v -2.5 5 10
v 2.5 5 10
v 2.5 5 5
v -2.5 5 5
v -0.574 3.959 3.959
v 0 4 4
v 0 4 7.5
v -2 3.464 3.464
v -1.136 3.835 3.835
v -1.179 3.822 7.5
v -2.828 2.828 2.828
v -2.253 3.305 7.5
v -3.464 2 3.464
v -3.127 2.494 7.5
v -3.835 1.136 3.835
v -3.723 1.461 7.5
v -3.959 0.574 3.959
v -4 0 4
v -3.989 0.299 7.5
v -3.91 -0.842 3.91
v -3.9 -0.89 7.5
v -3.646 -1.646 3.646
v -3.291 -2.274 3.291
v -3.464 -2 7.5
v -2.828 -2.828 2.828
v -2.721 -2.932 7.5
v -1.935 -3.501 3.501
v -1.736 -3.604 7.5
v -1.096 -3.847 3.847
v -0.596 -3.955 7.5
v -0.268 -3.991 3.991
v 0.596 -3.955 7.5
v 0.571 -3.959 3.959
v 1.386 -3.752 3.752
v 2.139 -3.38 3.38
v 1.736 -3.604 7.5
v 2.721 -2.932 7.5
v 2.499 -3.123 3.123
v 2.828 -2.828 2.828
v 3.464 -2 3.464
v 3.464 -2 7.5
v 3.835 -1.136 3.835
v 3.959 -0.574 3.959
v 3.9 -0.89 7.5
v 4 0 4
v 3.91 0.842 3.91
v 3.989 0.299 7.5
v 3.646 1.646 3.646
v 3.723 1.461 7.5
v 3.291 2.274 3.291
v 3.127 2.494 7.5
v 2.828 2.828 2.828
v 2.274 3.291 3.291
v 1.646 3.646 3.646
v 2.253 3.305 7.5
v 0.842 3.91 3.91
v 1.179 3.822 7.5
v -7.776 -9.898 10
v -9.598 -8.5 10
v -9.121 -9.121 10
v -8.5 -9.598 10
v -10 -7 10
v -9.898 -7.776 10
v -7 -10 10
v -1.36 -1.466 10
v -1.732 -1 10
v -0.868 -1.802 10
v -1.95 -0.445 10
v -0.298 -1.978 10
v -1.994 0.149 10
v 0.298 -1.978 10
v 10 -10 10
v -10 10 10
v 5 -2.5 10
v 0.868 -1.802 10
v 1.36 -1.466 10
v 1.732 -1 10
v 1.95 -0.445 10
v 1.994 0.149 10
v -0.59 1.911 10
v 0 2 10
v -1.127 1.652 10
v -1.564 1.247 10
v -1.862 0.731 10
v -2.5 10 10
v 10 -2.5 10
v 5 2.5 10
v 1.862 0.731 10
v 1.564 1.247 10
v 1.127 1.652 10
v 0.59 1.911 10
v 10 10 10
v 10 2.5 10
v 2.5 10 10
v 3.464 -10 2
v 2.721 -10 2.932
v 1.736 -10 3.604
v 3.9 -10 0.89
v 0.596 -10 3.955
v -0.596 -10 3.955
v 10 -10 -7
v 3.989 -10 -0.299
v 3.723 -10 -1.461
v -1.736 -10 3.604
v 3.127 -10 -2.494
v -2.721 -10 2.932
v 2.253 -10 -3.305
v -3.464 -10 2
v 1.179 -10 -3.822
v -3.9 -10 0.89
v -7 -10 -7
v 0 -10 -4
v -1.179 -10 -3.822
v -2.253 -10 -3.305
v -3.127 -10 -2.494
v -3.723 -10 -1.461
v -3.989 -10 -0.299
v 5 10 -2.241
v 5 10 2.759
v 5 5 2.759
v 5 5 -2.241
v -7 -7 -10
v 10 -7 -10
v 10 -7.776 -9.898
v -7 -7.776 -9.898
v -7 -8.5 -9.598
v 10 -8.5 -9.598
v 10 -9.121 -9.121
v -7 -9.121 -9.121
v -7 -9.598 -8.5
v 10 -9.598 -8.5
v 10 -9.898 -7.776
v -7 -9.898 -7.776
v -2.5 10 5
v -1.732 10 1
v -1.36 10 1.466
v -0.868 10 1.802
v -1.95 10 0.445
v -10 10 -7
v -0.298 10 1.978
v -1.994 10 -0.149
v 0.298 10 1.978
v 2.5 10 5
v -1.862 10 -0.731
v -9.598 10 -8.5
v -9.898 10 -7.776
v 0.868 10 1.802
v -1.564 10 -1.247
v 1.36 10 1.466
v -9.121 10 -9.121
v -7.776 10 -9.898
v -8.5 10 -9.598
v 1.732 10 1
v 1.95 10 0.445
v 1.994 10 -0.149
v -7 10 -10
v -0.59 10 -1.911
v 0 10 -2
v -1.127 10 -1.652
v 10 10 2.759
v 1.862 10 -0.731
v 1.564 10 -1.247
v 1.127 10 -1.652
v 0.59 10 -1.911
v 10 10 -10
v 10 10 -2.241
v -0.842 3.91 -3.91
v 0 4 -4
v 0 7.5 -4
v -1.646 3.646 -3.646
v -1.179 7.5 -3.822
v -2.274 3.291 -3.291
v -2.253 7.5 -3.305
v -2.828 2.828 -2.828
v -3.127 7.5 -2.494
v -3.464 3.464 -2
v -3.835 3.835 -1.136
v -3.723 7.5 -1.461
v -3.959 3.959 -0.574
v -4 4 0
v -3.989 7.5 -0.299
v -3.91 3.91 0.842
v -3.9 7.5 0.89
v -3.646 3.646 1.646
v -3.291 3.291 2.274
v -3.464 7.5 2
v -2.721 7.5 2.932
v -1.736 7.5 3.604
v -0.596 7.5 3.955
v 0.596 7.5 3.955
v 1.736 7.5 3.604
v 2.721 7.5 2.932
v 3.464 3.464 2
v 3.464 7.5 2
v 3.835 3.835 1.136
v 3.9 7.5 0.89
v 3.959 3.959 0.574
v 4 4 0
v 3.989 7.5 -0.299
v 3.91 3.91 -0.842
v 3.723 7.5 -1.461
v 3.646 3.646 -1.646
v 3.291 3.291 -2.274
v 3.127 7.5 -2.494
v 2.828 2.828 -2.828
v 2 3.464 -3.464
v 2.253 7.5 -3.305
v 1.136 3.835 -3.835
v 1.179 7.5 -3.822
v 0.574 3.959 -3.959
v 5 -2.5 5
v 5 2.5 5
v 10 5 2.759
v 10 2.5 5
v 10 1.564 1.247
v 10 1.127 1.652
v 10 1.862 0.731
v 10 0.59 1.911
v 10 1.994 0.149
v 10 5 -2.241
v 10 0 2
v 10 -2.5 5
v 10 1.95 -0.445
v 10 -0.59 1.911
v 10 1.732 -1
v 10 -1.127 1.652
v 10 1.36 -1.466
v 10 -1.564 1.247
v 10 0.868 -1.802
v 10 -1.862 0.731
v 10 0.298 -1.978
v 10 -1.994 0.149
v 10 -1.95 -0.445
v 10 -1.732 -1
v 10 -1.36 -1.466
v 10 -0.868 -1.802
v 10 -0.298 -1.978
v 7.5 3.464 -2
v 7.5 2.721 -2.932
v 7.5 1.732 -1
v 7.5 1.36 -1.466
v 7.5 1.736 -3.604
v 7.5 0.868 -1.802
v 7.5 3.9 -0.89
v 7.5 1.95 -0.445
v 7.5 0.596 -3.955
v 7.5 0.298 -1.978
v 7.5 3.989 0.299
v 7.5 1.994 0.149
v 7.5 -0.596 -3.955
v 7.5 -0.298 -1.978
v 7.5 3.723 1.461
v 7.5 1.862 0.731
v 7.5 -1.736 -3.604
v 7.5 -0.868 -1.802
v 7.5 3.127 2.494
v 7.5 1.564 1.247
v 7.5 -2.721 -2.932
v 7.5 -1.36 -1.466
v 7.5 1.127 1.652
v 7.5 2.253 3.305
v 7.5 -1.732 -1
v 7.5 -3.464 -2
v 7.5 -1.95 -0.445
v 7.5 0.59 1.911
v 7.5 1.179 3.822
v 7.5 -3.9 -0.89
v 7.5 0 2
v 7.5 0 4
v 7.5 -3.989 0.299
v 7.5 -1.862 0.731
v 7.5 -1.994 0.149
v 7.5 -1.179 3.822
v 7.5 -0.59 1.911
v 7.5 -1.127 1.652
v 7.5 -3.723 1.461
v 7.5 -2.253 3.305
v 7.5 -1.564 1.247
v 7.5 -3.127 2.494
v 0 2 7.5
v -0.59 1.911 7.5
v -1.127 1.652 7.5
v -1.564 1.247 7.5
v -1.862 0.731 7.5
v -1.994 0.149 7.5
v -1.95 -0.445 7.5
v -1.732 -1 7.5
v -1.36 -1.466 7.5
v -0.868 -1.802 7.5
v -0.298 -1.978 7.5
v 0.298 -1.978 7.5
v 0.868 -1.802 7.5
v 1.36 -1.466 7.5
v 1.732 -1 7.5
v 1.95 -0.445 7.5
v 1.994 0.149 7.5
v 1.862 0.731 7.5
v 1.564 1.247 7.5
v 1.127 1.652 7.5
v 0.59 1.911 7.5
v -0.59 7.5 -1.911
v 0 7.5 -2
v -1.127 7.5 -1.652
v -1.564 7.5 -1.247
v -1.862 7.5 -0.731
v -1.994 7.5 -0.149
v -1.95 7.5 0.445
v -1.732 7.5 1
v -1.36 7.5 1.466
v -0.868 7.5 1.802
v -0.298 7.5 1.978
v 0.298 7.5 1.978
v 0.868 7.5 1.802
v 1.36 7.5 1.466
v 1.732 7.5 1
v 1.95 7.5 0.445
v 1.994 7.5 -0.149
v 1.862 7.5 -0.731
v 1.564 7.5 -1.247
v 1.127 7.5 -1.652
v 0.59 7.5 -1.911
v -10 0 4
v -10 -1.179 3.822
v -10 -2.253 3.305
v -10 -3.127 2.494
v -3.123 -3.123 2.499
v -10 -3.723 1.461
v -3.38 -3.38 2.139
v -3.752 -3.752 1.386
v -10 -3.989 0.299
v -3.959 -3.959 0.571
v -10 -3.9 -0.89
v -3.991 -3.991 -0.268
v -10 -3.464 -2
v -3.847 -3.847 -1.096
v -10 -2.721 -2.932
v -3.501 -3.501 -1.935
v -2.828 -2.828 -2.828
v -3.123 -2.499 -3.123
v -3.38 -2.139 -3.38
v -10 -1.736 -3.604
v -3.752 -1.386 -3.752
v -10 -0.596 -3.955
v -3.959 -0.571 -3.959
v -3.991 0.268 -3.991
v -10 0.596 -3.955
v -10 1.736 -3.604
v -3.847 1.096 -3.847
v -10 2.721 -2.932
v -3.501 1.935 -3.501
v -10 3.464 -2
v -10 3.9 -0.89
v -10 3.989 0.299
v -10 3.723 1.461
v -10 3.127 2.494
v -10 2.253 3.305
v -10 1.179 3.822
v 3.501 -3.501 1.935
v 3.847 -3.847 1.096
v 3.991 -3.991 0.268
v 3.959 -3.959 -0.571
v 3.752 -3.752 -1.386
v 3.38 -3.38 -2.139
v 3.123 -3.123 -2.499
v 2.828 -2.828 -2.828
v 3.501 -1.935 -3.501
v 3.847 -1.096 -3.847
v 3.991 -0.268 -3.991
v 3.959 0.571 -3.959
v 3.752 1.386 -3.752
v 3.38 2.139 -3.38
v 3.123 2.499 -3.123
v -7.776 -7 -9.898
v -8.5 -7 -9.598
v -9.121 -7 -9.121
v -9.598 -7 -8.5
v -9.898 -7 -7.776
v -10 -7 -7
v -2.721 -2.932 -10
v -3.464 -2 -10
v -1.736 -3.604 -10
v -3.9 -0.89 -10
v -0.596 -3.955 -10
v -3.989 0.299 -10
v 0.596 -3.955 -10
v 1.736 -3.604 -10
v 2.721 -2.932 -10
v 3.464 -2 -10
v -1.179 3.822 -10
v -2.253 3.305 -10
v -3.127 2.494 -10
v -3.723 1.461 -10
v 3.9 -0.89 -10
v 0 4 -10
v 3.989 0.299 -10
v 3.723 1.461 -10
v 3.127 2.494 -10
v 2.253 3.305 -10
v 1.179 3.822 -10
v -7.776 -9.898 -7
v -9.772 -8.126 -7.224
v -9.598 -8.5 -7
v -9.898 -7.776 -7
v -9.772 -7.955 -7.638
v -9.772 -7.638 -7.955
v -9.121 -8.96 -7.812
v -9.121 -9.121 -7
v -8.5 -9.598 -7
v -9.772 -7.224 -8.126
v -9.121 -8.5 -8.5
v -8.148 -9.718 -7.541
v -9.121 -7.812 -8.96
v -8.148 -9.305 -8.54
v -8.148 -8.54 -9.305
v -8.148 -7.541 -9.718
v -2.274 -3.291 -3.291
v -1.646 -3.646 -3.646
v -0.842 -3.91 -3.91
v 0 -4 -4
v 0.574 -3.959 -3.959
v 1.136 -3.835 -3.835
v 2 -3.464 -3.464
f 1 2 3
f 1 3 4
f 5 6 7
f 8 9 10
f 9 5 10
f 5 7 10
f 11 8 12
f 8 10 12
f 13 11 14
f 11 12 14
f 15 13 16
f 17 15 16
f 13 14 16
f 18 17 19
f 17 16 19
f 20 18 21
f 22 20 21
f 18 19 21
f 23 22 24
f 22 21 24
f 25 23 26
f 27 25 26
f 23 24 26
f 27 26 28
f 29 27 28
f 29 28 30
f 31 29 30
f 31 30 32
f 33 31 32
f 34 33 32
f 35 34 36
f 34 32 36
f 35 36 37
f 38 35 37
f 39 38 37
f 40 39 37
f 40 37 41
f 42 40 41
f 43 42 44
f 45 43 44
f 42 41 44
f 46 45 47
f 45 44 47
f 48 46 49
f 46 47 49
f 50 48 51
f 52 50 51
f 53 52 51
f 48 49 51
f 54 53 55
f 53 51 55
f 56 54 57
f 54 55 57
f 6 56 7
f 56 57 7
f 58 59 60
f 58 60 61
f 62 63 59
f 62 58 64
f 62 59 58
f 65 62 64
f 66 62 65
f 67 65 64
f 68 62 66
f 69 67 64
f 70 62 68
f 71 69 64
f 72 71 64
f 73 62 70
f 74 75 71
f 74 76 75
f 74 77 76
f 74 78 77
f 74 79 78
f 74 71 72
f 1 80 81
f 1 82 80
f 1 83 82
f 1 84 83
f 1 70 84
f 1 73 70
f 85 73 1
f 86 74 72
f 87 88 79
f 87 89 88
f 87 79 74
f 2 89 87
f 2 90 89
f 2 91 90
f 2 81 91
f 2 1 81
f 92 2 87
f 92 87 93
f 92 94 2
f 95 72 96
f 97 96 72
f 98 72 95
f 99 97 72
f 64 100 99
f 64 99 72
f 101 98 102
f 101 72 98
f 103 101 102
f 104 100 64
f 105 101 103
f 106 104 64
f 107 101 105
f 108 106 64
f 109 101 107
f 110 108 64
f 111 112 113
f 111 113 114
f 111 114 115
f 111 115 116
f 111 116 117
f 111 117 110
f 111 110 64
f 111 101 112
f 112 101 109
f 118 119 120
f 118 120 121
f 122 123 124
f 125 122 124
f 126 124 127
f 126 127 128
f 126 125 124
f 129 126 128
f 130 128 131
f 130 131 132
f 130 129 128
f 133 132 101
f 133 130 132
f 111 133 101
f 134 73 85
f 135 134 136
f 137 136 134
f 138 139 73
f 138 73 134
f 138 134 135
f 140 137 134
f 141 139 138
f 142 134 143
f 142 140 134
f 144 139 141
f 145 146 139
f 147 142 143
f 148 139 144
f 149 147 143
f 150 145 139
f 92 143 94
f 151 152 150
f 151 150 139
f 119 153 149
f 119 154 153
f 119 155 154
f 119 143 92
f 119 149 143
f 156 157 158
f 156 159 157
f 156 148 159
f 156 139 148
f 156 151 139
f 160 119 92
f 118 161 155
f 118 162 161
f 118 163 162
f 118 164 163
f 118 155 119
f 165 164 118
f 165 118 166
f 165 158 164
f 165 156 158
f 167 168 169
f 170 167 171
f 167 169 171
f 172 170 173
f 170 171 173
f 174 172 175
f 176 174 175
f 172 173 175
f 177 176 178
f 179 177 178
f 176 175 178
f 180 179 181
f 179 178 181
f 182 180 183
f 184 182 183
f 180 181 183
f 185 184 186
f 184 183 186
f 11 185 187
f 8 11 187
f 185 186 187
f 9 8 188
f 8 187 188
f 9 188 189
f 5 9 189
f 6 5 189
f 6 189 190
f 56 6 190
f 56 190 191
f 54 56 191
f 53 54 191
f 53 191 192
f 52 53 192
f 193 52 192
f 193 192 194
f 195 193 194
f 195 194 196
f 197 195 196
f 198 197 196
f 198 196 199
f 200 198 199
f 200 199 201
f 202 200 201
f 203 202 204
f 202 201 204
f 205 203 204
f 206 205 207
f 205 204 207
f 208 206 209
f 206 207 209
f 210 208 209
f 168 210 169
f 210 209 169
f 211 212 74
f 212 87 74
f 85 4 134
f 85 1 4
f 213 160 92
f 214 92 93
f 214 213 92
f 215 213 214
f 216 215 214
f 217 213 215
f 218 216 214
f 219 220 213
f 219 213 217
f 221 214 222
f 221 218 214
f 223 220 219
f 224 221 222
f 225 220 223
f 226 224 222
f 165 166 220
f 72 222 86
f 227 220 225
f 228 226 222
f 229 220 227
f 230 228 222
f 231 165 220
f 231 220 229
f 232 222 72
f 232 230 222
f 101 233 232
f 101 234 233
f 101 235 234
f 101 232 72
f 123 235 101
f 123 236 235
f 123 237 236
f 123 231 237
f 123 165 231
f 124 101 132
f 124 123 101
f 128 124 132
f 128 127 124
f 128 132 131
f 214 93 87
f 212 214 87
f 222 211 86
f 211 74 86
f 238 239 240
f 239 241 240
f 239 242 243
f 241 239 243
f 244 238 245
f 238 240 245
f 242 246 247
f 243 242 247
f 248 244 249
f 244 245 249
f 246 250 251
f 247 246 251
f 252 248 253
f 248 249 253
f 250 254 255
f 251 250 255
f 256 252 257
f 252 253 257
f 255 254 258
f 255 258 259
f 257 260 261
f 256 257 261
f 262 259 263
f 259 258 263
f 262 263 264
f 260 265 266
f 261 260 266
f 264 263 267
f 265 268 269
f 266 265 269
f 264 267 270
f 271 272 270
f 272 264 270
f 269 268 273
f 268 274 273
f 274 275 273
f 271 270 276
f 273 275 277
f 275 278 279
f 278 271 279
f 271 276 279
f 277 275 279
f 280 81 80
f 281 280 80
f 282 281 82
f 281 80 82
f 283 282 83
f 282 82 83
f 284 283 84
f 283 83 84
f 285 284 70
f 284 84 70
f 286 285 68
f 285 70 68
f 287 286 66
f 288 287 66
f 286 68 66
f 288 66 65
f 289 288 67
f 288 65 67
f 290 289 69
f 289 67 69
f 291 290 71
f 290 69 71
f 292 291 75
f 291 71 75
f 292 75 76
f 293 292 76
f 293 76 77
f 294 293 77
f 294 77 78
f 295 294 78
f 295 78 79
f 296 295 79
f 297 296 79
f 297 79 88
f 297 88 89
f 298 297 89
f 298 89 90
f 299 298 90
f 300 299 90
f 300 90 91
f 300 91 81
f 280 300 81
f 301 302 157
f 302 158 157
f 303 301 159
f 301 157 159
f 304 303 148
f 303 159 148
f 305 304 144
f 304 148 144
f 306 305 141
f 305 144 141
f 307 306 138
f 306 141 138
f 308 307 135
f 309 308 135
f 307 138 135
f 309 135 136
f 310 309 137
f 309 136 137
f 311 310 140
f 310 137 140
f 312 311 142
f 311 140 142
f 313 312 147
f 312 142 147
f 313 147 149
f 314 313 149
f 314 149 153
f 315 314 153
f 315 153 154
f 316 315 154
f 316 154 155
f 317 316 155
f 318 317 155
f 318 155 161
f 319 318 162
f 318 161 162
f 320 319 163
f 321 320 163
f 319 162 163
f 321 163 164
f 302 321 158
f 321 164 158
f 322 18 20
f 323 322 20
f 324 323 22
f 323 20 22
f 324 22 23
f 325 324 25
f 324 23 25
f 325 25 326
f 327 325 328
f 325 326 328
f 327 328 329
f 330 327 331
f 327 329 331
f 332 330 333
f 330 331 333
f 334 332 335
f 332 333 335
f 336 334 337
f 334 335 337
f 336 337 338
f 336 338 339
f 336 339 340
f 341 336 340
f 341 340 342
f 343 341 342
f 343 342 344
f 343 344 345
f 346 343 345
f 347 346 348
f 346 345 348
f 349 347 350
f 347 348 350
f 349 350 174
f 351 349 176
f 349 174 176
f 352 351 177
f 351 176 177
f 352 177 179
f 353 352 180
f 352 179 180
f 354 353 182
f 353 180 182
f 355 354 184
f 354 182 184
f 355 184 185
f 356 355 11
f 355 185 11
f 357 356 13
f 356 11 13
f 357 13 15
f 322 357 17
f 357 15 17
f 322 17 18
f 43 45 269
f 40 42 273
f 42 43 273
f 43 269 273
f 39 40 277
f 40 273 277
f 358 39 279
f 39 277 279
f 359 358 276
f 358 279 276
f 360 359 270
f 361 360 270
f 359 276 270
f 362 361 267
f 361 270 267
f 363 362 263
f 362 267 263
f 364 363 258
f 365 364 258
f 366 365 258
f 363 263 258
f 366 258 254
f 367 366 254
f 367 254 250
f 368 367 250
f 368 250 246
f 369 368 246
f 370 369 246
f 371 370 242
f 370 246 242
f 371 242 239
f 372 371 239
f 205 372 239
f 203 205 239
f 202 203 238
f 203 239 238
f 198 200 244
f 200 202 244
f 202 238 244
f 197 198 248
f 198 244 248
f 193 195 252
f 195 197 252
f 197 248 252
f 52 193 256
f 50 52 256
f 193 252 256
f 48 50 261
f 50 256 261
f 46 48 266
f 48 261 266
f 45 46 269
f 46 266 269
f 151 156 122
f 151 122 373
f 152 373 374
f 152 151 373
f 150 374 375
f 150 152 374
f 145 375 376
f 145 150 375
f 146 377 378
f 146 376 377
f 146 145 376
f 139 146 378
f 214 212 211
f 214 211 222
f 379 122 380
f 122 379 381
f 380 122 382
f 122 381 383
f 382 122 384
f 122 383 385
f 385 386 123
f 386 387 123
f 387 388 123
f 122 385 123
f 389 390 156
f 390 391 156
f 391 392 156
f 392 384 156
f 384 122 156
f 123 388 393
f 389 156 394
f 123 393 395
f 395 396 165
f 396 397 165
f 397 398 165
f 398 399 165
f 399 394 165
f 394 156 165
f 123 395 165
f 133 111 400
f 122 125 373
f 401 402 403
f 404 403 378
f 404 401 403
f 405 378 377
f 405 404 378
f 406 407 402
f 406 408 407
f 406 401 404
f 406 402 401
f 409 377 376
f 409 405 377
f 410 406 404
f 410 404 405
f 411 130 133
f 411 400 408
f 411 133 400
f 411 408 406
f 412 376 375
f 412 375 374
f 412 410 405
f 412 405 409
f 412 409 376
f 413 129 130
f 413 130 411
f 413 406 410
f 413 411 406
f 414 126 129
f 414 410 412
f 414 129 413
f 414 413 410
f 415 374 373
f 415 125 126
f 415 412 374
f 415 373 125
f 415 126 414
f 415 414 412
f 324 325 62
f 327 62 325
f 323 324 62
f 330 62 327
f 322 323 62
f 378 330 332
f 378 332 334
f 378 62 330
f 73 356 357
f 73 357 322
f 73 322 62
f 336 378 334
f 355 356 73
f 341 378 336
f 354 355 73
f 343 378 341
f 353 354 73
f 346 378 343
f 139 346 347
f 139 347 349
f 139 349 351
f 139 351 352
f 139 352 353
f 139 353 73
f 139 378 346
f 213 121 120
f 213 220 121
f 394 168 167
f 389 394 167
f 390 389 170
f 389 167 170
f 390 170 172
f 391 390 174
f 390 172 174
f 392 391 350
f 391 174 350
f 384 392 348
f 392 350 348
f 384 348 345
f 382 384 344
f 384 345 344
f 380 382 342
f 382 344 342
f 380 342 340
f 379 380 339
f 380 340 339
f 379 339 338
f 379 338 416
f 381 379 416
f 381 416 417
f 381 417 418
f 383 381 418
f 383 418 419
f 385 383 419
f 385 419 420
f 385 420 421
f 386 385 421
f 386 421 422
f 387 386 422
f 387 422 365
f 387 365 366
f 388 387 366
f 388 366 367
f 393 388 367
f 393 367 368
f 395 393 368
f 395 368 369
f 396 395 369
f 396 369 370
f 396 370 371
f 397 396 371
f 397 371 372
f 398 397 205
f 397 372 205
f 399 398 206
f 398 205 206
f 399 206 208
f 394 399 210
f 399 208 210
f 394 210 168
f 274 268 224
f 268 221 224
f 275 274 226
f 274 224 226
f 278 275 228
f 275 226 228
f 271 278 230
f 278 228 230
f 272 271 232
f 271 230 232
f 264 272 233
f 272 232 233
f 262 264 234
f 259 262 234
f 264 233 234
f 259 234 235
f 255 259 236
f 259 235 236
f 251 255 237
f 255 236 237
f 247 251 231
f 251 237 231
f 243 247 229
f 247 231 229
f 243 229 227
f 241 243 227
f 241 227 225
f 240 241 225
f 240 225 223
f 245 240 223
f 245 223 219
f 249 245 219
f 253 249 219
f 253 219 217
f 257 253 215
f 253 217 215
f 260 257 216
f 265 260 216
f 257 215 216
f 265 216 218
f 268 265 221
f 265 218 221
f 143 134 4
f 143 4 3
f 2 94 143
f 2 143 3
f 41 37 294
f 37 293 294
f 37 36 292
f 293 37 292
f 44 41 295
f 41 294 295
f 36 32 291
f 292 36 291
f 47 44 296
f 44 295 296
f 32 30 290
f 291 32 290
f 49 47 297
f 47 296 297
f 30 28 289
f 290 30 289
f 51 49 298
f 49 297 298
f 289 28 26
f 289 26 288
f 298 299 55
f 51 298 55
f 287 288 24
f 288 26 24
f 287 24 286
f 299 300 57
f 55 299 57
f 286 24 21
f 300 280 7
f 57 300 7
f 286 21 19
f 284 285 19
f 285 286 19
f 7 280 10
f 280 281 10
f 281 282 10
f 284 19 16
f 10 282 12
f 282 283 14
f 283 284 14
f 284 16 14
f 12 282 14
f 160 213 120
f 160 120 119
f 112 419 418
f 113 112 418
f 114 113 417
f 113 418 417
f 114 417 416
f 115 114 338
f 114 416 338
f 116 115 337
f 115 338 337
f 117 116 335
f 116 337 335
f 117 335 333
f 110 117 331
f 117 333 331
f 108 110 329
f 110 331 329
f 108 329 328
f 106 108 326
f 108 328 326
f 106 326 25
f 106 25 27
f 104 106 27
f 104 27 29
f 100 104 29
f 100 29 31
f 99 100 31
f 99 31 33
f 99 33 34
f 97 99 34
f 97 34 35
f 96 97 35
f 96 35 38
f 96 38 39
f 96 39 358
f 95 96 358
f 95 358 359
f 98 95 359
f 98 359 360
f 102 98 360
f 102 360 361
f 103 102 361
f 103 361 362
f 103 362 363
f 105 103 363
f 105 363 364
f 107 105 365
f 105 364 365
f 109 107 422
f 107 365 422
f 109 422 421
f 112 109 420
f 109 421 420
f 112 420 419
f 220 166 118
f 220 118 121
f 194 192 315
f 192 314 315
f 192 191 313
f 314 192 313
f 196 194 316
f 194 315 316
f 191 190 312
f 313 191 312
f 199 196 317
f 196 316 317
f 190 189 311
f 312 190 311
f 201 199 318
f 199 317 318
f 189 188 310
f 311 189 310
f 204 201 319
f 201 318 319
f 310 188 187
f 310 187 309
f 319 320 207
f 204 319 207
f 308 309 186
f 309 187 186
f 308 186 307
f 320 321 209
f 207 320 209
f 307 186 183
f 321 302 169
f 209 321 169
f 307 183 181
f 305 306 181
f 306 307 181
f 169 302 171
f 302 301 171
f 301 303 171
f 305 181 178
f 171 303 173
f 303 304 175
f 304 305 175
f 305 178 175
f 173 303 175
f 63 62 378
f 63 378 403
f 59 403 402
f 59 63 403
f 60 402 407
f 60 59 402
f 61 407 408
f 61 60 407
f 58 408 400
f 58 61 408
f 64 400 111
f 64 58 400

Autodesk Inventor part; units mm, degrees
ref_plane "YZ Plane" through (0, 0, 0) normal (1, 0, 0) x (0, 1, 0)
ref_plane "XZ Plane" through (0, 0, 0) normal (0, 1, 0) x (-1, 0, 0)
ref_plane "XY Plane" through (0, 0, 0) normal (0, 0, 1) x (1, 0, 0)
sketch "Sketch1" plane through (0, 0, 0) normal (0, 0, 1) x (1, 0, 0)
  line L0 (-10, 10) -> (10, 10)
  line L1 (10, 10) -> (10, -10)
  line L2 (10, -10) -> (-10, -10)
  line L3 (-10, -10) -> (-10, 10)
  line L4 (-10, 10) -> (10, -10) construction
  line L5 (10, 10) -> (-10, -10) construction
  point P0 (0, 0)
  dimension "d0" = 20
  dimension "d1" = 20
extrude "Extrusion1" add sketch "Sketch1" along normal mid plane 20
sketch "Sketch2" plane through (0, 0, 10) normal (0, 0, 1) x (1, 0, 0)
  line L0 (10, 10) -> (-10, 10) projected
  line L1 (-2.5, 10) -> (2.5, 10)
  line L2 (2.5, 10) -> (2.5, 5)
  line L3 (2.5, 5) -> (-2.5, 5)
  line L4 (-2.5, 5) -> (-2.5, 10)
  line L5 (-10, 10) -> (-10, -10) projected
  line L6 (10, -10) -> (10, 10) projected
  line L7 (10, 2.5) -> (5, 2.5)
  line L8 (5, 2.5) -> (5, -2.5)
  line L9 (5, -2.5) -> (10, -2.5)
  line L10 (10, -2.5) -> (10, 2.5)
  point P0 (0, 0)
  dimension "d4" = 5
  dimension "d5" = 5
  dimension "d6" = 7.5
  dimension "d7" = 5
  dimension "d8" = 5
  dimension "d9" = 7.5
extrude "Extrusion2" cut sketch "Sketch2" against normal blind 5
sketch "Sketch3" plane through (10, -10, -10) normal (1, 0, 0) x (0, 0, -1)
  line L0 (0, 20) -> (-20, 20) projected
  line L1 (-12.7592, 20) -> (-7.7592, 20)
  line L2 (-7.7592, 20) -> (-7.7592, 15)
  line L3 (-7.7592, 15) -> (-12.7592, 15)
  line L4 (-12.7592, 15) -> (-12.7592, 20)
  point P0 (-10, 10)
  dimension "d12" = 5
  dimension "d13" = 5
extrude "Extrusion3" cut sketch "Sketch3" against normal blind 5
sketch "Sketch8" plane through (-10, -10, 10) normal (-1, 0, 0) x (0, 0, 1)
  circle A0 centre (-10, 10) radius 2.3529
sketch "Sketch9" plane through (-10, -10, 10) normal (0, -1, 0) x (1, 0, 0)
  circle A0 centre (10, -10) radius 2.6586
sketch "Sketch10" plane through (0, 0, -10) normal (0, 0, -1) x (-1, 0, 0)
  circle A0 centre (0, 0) radius 2.2697
hole "Hole3" at (0, -10, 0) direction (0, 1, 0) diameter 4 depth 29.3 tip angle 118 counterbore diameter 8 counterbore depth 17.5
hole "Hole4" at (0, 0, -10) direction (0, 0, 1) diameter 4 depth 29.3 tip angle 118 counterbore diameter 8 counterbore depth 17.5
hole "Hole5" at (-10, 0, 0) direction (1, 0, 0) diameter 4 depth 29.3 tip angle 118 counterbore diameter 8 counterbore depth 17.5
fillet "Fillet2" radius 3 3 edges at (0, -10, -10) (-10, -10, 0) (-10, 0, -10)
properties part number "HansKube.stl"
